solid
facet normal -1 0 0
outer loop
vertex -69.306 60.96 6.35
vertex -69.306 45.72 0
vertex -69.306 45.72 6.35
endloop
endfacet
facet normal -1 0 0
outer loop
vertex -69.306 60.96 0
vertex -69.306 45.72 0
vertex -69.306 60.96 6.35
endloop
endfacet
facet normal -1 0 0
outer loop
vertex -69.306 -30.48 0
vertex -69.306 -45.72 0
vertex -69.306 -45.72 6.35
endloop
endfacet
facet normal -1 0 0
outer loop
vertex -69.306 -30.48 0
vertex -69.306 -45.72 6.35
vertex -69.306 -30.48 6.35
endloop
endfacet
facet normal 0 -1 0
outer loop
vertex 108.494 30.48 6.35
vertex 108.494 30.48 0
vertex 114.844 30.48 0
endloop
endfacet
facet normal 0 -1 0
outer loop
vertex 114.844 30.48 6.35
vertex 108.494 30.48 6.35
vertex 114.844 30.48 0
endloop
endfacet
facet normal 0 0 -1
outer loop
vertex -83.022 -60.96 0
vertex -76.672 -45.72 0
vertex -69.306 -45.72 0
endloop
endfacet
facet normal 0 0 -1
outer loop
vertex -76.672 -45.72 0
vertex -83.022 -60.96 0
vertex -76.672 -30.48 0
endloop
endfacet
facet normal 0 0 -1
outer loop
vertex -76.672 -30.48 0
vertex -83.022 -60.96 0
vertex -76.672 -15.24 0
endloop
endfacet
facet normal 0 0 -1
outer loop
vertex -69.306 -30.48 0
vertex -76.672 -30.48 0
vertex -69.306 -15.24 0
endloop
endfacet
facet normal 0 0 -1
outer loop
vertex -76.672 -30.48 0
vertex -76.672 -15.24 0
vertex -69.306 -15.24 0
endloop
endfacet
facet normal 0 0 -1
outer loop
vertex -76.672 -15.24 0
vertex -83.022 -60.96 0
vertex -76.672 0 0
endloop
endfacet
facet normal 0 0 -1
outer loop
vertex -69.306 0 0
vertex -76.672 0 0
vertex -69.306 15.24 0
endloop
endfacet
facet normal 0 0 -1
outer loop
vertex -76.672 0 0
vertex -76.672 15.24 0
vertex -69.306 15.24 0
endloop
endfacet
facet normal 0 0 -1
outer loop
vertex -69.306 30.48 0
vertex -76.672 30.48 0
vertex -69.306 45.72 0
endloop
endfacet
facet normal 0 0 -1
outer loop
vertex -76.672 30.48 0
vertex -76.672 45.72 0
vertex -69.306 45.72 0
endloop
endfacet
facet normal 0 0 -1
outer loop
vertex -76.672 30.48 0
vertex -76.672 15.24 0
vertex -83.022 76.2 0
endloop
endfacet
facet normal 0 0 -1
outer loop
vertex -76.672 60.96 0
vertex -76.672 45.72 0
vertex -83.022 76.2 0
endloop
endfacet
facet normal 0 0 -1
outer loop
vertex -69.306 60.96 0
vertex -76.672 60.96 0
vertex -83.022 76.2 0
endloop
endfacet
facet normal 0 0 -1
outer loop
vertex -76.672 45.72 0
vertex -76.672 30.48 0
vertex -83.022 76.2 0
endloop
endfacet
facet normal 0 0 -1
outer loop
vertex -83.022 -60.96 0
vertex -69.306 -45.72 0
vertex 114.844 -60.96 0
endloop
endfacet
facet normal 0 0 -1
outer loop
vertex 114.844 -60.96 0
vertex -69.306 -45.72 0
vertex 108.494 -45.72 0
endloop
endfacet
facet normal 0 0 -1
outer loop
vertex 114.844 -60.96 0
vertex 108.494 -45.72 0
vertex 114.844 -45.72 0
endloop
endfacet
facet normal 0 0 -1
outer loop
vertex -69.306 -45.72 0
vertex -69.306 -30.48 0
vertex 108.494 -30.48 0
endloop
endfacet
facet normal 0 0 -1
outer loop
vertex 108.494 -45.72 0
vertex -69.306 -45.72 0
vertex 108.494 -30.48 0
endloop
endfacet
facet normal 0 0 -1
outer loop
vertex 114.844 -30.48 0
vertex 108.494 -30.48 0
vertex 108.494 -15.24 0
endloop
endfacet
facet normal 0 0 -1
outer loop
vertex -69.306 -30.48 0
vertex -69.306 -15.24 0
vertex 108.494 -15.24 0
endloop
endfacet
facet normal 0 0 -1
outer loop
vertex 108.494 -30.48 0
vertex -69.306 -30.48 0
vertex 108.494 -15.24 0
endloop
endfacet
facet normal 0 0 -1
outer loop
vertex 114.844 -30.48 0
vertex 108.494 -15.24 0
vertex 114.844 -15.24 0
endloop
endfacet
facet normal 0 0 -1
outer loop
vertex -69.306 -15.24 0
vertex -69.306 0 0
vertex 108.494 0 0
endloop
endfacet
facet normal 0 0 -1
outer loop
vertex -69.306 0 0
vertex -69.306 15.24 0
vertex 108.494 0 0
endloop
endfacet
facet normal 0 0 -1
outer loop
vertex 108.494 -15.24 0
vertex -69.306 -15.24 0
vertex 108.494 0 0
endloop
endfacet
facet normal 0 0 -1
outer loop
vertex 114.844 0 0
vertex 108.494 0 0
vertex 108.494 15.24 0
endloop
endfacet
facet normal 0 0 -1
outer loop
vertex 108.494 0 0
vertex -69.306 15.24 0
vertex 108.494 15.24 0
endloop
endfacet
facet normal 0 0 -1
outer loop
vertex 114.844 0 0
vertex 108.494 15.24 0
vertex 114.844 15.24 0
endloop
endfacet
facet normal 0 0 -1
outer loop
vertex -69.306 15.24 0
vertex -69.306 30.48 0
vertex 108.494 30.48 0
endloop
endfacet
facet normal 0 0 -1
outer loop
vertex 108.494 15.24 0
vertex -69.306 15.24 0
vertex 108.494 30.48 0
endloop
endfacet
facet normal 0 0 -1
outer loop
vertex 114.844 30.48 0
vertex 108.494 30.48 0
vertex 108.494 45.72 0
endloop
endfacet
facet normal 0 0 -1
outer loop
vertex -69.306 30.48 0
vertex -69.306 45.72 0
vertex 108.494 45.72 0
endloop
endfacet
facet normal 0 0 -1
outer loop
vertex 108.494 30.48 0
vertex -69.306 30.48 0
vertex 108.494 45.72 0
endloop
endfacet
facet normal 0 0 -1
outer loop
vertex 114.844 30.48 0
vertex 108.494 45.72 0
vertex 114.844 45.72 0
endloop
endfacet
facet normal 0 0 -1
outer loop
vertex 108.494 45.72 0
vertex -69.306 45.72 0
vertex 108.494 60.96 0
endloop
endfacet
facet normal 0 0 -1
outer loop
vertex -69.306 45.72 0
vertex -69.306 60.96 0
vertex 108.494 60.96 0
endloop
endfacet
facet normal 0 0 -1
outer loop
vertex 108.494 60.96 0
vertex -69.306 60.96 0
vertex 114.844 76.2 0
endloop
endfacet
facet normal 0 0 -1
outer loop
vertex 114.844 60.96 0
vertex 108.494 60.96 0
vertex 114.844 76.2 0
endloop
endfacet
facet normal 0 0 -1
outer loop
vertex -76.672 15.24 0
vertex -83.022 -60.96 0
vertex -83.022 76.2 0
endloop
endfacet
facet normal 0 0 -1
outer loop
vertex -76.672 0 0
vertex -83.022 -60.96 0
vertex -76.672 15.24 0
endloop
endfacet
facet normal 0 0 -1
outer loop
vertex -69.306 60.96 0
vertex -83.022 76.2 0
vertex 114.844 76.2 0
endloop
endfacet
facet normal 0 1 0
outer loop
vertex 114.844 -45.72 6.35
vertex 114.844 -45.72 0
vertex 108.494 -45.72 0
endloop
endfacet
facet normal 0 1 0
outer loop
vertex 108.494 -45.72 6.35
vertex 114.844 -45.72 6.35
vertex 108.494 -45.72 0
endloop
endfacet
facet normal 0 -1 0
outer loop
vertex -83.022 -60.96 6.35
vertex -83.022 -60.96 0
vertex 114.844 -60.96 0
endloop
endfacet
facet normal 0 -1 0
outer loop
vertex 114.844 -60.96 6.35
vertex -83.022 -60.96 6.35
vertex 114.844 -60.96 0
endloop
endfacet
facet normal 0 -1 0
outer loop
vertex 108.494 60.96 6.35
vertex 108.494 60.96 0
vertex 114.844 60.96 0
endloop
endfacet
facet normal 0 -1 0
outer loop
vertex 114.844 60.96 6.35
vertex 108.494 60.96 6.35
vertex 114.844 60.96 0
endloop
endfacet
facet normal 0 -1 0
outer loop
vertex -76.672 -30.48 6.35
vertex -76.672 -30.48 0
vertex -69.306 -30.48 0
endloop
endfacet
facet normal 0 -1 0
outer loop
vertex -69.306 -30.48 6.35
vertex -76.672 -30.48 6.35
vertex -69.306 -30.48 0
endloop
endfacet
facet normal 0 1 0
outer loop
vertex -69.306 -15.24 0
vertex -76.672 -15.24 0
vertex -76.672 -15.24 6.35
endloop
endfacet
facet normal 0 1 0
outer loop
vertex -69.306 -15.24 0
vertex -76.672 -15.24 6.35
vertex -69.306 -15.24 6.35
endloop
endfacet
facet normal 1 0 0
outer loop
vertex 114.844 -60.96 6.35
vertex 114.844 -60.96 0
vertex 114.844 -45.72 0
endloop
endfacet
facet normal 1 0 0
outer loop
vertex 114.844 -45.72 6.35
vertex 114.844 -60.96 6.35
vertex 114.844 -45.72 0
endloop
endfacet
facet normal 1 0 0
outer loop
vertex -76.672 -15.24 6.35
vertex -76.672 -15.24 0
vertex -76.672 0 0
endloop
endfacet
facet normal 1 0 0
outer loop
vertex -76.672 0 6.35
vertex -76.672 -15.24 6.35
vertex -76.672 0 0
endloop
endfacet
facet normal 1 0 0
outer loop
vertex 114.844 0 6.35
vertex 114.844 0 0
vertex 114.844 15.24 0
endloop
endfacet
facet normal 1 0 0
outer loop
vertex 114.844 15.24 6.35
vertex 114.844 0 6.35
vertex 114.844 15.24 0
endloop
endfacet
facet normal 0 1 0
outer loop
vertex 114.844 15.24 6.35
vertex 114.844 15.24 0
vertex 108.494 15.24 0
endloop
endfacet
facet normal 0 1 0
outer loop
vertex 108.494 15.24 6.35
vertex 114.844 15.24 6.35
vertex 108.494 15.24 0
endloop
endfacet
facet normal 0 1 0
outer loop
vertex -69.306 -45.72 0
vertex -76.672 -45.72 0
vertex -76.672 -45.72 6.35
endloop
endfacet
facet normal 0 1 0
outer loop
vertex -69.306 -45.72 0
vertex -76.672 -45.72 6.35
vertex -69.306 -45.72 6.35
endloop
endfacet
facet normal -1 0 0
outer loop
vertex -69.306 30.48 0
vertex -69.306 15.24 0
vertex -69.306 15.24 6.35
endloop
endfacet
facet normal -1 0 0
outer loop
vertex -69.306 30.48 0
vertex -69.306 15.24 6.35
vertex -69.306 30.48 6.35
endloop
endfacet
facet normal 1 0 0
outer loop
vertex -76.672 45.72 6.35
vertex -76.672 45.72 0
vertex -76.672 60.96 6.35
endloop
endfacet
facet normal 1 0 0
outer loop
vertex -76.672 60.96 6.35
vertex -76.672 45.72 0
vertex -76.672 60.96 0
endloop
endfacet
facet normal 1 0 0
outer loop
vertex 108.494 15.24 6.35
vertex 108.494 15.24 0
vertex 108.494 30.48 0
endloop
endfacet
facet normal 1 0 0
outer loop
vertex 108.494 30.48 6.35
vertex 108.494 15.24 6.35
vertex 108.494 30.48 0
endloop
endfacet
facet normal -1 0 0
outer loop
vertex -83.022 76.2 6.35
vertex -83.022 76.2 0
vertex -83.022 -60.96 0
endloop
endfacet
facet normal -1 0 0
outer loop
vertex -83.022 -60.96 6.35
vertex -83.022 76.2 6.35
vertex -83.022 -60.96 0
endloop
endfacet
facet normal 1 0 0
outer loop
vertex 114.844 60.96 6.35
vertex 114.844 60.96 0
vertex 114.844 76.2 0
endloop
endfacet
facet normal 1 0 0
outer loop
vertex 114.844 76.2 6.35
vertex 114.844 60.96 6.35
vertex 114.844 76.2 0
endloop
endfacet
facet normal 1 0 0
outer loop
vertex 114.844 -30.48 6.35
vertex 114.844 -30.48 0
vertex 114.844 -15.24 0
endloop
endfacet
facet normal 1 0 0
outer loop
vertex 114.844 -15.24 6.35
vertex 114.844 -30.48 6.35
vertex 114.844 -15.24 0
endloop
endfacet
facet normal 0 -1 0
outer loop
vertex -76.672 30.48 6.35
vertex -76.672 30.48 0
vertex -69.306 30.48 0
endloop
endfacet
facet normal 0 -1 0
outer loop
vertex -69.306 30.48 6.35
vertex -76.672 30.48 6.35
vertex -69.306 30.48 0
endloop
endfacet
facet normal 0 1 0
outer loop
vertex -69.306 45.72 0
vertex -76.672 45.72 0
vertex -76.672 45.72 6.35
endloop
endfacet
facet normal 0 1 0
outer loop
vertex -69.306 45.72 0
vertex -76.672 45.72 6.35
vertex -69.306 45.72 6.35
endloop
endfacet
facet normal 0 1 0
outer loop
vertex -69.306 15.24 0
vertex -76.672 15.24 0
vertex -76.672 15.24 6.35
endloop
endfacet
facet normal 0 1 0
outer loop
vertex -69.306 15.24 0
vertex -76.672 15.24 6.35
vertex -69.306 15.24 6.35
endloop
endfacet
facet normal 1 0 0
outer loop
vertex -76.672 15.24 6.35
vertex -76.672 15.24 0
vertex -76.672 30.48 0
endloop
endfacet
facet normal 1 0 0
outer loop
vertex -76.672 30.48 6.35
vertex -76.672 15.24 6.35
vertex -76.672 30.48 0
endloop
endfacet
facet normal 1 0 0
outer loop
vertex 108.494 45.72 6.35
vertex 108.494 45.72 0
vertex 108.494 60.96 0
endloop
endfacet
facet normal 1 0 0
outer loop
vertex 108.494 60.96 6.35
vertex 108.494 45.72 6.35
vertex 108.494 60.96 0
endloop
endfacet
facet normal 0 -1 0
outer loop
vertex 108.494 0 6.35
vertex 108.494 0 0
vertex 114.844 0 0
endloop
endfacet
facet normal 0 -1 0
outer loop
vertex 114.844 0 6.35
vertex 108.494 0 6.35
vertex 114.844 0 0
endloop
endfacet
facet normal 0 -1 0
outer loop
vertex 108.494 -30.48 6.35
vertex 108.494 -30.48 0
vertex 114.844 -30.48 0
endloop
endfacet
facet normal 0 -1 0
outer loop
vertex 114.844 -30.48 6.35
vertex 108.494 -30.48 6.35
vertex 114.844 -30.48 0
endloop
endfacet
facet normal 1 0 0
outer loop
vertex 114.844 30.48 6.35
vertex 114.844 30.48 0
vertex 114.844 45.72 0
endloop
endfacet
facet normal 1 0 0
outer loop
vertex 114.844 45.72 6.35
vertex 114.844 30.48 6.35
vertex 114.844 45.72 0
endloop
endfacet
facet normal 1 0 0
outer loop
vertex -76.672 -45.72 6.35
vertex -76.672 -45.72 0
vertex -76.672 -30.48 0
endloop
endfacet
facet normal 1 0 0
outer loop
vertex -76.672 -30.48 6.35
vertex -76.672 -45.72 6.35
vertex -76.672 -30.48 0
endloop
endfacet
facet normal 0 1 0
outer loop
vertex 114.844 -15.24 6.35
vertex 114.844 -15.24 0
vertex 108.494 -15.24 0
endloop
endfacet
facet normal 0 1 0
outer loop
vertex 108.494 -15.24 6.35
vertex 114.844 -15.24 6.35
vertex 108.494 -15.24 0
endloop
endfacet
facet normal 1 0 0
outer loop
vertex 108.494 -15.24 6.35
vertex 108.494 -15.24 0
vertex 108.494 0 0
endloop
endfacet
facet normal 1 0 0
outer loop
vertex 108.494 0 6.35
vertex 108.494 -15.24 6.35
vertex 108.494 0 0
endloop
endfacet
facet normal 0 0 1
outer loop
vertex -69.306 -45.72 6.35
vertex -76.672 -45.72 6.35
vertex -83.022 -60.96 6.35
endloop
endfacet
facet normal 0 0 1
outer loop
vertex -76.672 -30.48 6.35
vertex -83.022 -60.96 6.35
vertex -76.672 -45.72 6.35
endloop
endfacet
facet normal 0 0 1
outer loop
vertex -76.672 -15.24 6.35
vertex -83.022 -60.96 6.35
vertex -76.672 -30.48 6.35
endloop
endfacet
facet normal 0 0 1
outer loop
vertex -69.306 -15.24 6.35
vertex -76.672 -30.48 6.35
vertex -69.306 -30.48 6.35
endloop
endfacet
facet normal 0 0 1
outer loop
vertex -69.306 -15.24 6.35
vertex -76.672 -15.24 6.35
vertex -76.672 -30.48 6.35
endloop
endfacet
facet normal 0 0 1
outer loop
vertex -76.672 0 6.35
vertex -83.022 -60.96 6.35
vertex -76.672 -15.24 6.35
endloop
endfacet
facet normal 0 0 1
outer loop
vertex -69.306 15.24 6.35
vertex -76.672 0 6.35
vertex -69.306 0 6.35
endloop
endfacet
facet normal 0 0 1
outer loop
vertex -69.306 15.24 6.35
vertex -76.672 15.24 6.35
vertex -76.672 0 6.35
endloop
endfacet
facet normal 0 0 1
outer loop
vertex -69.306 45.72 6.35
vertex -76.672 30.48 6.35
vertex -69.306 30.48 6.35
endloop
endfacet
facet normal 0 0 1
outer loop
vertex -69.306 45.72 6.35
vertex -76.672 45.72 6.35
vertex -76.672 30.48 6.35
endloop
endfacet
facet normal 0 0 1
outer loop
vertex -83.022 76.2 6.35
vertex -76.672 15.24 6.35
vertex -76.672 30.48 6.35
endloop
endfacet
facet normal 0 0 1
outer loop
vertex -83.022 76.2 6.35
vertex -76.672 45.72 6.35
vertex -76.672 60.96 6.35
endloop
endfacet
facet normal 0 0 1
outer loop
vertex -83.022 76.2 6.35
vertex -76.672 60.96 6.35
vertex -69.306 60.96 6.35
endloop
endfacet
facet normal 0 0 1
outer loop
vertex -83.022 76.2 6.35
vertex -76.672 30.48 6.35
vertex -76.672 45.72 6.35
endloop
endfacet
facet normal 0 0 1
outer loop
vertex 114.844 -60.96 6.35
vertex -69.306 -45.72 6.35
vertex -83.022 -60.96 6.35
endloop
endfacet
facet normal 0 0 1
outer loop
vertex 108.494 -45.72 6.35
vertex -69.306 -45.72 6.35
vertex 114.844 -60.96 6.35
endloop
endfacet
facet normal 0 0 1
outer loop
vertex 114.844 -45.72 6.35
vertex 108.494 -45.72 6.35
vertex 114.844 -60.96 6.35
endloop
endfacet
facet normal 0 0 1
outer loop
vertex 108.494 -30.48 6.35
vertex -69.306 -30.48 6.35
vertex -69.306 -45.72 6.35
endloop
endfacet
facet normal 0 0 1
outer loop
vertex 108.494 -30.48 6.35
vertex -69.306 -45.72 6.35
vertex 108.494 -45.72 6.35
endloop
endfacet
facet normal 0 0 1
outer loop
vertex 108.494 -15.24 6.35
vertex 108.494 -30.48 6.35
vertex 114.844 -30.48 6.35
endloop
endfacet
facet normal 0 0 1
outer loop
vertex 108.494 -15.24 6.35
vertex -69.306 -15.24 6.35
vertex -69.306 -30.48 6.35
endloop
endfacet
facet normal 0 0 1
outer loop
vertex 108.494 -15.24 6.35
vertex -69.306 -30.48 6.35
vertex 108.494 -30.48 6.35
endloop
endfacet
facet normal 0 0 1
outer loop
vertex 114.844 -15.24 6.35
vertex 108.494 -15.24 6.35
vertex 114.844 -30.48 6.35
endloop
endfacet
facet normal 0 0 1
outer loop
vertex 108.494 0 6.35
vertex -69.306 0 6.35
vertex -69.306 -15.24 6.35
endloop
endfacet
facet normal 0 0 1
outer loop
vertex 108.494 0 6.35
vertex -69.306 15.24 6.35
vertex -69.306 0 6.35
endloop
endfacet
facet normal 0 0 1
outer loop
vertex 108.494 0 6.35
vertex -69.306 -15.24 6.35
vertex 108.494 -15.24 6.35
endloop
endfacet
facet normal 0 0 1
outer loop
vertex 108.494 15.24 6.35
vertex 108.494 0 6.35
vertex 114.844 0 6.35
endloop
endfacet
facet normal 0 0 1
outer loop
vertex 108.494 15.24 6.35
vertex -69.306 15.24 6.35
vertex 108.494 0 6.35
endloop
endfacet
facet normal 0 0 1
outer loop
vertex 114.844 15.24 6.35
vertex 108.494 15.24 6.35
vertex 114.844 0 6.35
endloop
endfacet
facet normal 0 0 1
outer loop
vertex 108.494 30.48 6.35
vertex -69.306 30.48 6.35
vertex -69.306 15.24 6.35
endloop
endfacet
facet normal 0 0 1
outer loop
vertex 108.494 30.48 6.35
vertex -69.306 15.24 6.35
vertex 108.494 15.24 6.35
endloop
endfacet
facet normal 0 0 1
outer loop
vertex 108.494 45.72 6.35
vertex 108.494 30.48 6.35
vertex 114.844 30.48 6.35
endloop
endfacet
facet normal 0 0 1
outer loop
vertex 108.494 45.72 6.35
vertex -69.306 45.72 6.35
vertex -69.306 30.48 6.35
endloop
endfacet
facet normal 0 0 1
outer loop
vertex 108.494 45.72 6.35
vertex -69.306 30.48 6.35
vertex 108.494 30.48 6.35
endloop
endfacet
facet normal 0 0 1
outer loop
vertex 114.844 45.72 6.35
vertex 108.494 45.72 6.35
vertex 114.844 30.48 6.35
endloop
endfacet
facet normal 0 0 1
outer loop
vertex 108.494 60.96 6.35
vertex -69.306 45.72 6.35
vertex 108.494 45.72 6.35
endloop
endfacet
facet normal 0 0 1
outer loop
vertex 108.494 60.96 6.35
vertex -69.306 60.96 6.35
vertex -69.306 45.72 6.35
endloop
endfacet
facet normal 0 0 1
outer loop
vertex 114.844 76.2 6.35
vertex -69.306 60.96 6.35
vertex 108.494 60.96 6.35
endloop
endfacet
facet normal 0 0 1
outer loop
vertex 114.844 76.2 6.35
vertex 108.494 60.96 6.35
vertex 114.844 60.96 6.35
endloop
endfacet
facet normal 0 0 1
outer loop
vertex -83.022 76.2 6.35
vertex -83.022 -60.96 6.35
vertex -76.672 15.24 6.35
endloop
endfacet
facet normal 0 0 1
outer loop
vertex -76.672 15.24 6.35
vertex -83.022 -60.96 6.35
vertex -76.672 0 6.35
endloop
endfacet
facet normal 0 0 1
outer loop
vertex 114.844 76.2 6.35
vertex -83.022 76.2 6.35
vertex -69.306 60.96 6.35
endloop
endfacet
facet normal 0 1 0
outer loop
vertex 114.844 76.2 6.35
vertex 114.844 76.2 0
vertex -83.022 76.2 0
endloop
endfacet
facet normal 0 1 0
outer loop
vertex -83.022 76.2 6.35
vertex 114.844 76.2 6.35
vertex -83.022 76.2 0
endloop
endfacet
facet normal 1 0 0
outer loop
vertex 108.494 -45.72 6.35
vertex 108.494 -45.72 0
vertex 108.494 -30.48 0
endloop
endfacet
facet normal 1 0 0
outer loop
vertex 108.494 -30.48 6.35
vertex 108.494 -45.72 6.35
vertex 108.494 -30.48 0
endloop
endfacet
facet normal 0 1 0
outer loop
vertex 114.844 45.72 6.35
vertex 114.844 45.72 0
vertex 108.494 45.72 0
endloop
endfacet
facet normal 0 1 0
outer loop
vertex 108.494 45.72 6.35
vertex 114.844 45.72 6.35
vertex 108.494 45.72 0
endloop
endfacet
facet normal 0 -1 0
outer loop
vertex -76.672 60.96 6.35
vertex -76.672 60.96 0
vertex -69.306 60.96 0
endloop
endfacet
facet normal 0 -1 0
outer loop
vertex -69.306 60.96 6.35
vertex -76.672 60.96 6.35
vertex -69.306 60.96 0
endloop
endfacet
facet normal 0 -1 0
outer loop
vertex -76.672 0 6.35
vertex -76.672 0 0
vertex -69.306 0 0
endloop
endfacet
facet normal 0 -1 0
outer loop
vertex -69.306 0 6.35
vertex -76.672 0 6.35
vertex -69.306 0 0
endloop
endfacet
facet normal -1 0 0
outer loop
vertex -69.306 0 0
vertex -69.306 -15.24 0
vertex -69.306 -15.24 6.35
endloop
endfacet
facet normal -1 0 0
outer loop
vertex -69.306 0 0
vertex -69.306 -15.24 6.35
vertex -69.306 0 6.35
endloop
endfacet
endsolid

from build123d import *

# Parameters (mm, degrees)
F0_W     = 7.366
F0_H     = 15.24
F1_DEPTH = 6.35


with BuildPart() as f1:
    # F0 (on Top) → F1 (new body)
    with BuildSketch(Plane.XY):
        Polygon((108.494151, 76.2), (-69.305849, 76.2), (-76.671849, 76.2), (-83.021849, 76.2), (-83.021849, -60.96), (-76.671849, -60.96), (-69.305849, -60.96), (108.459485, -60.96), (114.844151, -60.96), (114.844151, -45.72), (108.494151, -45.72), (108.494151, -30.48), (114.844151, -30.48), (114.844151, -15.24), (108.494151, -15.24), (108.494151, 0), (114.844151, 0), (114.844151, 15.24), (108.494151, 15.24), (108.494151, 30.48), (114.844151, 30.48), (114.844151, 45.72), (108.494151, 45.72), (108.494151, 60.96), (114.844151, 60.96), (114.844151, 76.2), align=None)
        with Locations((-72.988849, -38.1)):
            Rectangle(F0_W, F0_H, mode=Mode.SUBTRACT)
        with Locations((-72.988849, -7.62)):
            Rectangle(F0_W, F0_H, mode=Mode.SUBTRACT)
        with Locations((-72.988849, 22.86)):
            Rectangle(F0_W, F0_H, mode=Mode.SUBTRACT)
        with Locations((-72.988849, 53.34)):
            Rectangle(F0_W, F0_H, mode=Mode.SUBTRACT)
    extrude(amount=F1_DEPTH)


solid = f1.part
